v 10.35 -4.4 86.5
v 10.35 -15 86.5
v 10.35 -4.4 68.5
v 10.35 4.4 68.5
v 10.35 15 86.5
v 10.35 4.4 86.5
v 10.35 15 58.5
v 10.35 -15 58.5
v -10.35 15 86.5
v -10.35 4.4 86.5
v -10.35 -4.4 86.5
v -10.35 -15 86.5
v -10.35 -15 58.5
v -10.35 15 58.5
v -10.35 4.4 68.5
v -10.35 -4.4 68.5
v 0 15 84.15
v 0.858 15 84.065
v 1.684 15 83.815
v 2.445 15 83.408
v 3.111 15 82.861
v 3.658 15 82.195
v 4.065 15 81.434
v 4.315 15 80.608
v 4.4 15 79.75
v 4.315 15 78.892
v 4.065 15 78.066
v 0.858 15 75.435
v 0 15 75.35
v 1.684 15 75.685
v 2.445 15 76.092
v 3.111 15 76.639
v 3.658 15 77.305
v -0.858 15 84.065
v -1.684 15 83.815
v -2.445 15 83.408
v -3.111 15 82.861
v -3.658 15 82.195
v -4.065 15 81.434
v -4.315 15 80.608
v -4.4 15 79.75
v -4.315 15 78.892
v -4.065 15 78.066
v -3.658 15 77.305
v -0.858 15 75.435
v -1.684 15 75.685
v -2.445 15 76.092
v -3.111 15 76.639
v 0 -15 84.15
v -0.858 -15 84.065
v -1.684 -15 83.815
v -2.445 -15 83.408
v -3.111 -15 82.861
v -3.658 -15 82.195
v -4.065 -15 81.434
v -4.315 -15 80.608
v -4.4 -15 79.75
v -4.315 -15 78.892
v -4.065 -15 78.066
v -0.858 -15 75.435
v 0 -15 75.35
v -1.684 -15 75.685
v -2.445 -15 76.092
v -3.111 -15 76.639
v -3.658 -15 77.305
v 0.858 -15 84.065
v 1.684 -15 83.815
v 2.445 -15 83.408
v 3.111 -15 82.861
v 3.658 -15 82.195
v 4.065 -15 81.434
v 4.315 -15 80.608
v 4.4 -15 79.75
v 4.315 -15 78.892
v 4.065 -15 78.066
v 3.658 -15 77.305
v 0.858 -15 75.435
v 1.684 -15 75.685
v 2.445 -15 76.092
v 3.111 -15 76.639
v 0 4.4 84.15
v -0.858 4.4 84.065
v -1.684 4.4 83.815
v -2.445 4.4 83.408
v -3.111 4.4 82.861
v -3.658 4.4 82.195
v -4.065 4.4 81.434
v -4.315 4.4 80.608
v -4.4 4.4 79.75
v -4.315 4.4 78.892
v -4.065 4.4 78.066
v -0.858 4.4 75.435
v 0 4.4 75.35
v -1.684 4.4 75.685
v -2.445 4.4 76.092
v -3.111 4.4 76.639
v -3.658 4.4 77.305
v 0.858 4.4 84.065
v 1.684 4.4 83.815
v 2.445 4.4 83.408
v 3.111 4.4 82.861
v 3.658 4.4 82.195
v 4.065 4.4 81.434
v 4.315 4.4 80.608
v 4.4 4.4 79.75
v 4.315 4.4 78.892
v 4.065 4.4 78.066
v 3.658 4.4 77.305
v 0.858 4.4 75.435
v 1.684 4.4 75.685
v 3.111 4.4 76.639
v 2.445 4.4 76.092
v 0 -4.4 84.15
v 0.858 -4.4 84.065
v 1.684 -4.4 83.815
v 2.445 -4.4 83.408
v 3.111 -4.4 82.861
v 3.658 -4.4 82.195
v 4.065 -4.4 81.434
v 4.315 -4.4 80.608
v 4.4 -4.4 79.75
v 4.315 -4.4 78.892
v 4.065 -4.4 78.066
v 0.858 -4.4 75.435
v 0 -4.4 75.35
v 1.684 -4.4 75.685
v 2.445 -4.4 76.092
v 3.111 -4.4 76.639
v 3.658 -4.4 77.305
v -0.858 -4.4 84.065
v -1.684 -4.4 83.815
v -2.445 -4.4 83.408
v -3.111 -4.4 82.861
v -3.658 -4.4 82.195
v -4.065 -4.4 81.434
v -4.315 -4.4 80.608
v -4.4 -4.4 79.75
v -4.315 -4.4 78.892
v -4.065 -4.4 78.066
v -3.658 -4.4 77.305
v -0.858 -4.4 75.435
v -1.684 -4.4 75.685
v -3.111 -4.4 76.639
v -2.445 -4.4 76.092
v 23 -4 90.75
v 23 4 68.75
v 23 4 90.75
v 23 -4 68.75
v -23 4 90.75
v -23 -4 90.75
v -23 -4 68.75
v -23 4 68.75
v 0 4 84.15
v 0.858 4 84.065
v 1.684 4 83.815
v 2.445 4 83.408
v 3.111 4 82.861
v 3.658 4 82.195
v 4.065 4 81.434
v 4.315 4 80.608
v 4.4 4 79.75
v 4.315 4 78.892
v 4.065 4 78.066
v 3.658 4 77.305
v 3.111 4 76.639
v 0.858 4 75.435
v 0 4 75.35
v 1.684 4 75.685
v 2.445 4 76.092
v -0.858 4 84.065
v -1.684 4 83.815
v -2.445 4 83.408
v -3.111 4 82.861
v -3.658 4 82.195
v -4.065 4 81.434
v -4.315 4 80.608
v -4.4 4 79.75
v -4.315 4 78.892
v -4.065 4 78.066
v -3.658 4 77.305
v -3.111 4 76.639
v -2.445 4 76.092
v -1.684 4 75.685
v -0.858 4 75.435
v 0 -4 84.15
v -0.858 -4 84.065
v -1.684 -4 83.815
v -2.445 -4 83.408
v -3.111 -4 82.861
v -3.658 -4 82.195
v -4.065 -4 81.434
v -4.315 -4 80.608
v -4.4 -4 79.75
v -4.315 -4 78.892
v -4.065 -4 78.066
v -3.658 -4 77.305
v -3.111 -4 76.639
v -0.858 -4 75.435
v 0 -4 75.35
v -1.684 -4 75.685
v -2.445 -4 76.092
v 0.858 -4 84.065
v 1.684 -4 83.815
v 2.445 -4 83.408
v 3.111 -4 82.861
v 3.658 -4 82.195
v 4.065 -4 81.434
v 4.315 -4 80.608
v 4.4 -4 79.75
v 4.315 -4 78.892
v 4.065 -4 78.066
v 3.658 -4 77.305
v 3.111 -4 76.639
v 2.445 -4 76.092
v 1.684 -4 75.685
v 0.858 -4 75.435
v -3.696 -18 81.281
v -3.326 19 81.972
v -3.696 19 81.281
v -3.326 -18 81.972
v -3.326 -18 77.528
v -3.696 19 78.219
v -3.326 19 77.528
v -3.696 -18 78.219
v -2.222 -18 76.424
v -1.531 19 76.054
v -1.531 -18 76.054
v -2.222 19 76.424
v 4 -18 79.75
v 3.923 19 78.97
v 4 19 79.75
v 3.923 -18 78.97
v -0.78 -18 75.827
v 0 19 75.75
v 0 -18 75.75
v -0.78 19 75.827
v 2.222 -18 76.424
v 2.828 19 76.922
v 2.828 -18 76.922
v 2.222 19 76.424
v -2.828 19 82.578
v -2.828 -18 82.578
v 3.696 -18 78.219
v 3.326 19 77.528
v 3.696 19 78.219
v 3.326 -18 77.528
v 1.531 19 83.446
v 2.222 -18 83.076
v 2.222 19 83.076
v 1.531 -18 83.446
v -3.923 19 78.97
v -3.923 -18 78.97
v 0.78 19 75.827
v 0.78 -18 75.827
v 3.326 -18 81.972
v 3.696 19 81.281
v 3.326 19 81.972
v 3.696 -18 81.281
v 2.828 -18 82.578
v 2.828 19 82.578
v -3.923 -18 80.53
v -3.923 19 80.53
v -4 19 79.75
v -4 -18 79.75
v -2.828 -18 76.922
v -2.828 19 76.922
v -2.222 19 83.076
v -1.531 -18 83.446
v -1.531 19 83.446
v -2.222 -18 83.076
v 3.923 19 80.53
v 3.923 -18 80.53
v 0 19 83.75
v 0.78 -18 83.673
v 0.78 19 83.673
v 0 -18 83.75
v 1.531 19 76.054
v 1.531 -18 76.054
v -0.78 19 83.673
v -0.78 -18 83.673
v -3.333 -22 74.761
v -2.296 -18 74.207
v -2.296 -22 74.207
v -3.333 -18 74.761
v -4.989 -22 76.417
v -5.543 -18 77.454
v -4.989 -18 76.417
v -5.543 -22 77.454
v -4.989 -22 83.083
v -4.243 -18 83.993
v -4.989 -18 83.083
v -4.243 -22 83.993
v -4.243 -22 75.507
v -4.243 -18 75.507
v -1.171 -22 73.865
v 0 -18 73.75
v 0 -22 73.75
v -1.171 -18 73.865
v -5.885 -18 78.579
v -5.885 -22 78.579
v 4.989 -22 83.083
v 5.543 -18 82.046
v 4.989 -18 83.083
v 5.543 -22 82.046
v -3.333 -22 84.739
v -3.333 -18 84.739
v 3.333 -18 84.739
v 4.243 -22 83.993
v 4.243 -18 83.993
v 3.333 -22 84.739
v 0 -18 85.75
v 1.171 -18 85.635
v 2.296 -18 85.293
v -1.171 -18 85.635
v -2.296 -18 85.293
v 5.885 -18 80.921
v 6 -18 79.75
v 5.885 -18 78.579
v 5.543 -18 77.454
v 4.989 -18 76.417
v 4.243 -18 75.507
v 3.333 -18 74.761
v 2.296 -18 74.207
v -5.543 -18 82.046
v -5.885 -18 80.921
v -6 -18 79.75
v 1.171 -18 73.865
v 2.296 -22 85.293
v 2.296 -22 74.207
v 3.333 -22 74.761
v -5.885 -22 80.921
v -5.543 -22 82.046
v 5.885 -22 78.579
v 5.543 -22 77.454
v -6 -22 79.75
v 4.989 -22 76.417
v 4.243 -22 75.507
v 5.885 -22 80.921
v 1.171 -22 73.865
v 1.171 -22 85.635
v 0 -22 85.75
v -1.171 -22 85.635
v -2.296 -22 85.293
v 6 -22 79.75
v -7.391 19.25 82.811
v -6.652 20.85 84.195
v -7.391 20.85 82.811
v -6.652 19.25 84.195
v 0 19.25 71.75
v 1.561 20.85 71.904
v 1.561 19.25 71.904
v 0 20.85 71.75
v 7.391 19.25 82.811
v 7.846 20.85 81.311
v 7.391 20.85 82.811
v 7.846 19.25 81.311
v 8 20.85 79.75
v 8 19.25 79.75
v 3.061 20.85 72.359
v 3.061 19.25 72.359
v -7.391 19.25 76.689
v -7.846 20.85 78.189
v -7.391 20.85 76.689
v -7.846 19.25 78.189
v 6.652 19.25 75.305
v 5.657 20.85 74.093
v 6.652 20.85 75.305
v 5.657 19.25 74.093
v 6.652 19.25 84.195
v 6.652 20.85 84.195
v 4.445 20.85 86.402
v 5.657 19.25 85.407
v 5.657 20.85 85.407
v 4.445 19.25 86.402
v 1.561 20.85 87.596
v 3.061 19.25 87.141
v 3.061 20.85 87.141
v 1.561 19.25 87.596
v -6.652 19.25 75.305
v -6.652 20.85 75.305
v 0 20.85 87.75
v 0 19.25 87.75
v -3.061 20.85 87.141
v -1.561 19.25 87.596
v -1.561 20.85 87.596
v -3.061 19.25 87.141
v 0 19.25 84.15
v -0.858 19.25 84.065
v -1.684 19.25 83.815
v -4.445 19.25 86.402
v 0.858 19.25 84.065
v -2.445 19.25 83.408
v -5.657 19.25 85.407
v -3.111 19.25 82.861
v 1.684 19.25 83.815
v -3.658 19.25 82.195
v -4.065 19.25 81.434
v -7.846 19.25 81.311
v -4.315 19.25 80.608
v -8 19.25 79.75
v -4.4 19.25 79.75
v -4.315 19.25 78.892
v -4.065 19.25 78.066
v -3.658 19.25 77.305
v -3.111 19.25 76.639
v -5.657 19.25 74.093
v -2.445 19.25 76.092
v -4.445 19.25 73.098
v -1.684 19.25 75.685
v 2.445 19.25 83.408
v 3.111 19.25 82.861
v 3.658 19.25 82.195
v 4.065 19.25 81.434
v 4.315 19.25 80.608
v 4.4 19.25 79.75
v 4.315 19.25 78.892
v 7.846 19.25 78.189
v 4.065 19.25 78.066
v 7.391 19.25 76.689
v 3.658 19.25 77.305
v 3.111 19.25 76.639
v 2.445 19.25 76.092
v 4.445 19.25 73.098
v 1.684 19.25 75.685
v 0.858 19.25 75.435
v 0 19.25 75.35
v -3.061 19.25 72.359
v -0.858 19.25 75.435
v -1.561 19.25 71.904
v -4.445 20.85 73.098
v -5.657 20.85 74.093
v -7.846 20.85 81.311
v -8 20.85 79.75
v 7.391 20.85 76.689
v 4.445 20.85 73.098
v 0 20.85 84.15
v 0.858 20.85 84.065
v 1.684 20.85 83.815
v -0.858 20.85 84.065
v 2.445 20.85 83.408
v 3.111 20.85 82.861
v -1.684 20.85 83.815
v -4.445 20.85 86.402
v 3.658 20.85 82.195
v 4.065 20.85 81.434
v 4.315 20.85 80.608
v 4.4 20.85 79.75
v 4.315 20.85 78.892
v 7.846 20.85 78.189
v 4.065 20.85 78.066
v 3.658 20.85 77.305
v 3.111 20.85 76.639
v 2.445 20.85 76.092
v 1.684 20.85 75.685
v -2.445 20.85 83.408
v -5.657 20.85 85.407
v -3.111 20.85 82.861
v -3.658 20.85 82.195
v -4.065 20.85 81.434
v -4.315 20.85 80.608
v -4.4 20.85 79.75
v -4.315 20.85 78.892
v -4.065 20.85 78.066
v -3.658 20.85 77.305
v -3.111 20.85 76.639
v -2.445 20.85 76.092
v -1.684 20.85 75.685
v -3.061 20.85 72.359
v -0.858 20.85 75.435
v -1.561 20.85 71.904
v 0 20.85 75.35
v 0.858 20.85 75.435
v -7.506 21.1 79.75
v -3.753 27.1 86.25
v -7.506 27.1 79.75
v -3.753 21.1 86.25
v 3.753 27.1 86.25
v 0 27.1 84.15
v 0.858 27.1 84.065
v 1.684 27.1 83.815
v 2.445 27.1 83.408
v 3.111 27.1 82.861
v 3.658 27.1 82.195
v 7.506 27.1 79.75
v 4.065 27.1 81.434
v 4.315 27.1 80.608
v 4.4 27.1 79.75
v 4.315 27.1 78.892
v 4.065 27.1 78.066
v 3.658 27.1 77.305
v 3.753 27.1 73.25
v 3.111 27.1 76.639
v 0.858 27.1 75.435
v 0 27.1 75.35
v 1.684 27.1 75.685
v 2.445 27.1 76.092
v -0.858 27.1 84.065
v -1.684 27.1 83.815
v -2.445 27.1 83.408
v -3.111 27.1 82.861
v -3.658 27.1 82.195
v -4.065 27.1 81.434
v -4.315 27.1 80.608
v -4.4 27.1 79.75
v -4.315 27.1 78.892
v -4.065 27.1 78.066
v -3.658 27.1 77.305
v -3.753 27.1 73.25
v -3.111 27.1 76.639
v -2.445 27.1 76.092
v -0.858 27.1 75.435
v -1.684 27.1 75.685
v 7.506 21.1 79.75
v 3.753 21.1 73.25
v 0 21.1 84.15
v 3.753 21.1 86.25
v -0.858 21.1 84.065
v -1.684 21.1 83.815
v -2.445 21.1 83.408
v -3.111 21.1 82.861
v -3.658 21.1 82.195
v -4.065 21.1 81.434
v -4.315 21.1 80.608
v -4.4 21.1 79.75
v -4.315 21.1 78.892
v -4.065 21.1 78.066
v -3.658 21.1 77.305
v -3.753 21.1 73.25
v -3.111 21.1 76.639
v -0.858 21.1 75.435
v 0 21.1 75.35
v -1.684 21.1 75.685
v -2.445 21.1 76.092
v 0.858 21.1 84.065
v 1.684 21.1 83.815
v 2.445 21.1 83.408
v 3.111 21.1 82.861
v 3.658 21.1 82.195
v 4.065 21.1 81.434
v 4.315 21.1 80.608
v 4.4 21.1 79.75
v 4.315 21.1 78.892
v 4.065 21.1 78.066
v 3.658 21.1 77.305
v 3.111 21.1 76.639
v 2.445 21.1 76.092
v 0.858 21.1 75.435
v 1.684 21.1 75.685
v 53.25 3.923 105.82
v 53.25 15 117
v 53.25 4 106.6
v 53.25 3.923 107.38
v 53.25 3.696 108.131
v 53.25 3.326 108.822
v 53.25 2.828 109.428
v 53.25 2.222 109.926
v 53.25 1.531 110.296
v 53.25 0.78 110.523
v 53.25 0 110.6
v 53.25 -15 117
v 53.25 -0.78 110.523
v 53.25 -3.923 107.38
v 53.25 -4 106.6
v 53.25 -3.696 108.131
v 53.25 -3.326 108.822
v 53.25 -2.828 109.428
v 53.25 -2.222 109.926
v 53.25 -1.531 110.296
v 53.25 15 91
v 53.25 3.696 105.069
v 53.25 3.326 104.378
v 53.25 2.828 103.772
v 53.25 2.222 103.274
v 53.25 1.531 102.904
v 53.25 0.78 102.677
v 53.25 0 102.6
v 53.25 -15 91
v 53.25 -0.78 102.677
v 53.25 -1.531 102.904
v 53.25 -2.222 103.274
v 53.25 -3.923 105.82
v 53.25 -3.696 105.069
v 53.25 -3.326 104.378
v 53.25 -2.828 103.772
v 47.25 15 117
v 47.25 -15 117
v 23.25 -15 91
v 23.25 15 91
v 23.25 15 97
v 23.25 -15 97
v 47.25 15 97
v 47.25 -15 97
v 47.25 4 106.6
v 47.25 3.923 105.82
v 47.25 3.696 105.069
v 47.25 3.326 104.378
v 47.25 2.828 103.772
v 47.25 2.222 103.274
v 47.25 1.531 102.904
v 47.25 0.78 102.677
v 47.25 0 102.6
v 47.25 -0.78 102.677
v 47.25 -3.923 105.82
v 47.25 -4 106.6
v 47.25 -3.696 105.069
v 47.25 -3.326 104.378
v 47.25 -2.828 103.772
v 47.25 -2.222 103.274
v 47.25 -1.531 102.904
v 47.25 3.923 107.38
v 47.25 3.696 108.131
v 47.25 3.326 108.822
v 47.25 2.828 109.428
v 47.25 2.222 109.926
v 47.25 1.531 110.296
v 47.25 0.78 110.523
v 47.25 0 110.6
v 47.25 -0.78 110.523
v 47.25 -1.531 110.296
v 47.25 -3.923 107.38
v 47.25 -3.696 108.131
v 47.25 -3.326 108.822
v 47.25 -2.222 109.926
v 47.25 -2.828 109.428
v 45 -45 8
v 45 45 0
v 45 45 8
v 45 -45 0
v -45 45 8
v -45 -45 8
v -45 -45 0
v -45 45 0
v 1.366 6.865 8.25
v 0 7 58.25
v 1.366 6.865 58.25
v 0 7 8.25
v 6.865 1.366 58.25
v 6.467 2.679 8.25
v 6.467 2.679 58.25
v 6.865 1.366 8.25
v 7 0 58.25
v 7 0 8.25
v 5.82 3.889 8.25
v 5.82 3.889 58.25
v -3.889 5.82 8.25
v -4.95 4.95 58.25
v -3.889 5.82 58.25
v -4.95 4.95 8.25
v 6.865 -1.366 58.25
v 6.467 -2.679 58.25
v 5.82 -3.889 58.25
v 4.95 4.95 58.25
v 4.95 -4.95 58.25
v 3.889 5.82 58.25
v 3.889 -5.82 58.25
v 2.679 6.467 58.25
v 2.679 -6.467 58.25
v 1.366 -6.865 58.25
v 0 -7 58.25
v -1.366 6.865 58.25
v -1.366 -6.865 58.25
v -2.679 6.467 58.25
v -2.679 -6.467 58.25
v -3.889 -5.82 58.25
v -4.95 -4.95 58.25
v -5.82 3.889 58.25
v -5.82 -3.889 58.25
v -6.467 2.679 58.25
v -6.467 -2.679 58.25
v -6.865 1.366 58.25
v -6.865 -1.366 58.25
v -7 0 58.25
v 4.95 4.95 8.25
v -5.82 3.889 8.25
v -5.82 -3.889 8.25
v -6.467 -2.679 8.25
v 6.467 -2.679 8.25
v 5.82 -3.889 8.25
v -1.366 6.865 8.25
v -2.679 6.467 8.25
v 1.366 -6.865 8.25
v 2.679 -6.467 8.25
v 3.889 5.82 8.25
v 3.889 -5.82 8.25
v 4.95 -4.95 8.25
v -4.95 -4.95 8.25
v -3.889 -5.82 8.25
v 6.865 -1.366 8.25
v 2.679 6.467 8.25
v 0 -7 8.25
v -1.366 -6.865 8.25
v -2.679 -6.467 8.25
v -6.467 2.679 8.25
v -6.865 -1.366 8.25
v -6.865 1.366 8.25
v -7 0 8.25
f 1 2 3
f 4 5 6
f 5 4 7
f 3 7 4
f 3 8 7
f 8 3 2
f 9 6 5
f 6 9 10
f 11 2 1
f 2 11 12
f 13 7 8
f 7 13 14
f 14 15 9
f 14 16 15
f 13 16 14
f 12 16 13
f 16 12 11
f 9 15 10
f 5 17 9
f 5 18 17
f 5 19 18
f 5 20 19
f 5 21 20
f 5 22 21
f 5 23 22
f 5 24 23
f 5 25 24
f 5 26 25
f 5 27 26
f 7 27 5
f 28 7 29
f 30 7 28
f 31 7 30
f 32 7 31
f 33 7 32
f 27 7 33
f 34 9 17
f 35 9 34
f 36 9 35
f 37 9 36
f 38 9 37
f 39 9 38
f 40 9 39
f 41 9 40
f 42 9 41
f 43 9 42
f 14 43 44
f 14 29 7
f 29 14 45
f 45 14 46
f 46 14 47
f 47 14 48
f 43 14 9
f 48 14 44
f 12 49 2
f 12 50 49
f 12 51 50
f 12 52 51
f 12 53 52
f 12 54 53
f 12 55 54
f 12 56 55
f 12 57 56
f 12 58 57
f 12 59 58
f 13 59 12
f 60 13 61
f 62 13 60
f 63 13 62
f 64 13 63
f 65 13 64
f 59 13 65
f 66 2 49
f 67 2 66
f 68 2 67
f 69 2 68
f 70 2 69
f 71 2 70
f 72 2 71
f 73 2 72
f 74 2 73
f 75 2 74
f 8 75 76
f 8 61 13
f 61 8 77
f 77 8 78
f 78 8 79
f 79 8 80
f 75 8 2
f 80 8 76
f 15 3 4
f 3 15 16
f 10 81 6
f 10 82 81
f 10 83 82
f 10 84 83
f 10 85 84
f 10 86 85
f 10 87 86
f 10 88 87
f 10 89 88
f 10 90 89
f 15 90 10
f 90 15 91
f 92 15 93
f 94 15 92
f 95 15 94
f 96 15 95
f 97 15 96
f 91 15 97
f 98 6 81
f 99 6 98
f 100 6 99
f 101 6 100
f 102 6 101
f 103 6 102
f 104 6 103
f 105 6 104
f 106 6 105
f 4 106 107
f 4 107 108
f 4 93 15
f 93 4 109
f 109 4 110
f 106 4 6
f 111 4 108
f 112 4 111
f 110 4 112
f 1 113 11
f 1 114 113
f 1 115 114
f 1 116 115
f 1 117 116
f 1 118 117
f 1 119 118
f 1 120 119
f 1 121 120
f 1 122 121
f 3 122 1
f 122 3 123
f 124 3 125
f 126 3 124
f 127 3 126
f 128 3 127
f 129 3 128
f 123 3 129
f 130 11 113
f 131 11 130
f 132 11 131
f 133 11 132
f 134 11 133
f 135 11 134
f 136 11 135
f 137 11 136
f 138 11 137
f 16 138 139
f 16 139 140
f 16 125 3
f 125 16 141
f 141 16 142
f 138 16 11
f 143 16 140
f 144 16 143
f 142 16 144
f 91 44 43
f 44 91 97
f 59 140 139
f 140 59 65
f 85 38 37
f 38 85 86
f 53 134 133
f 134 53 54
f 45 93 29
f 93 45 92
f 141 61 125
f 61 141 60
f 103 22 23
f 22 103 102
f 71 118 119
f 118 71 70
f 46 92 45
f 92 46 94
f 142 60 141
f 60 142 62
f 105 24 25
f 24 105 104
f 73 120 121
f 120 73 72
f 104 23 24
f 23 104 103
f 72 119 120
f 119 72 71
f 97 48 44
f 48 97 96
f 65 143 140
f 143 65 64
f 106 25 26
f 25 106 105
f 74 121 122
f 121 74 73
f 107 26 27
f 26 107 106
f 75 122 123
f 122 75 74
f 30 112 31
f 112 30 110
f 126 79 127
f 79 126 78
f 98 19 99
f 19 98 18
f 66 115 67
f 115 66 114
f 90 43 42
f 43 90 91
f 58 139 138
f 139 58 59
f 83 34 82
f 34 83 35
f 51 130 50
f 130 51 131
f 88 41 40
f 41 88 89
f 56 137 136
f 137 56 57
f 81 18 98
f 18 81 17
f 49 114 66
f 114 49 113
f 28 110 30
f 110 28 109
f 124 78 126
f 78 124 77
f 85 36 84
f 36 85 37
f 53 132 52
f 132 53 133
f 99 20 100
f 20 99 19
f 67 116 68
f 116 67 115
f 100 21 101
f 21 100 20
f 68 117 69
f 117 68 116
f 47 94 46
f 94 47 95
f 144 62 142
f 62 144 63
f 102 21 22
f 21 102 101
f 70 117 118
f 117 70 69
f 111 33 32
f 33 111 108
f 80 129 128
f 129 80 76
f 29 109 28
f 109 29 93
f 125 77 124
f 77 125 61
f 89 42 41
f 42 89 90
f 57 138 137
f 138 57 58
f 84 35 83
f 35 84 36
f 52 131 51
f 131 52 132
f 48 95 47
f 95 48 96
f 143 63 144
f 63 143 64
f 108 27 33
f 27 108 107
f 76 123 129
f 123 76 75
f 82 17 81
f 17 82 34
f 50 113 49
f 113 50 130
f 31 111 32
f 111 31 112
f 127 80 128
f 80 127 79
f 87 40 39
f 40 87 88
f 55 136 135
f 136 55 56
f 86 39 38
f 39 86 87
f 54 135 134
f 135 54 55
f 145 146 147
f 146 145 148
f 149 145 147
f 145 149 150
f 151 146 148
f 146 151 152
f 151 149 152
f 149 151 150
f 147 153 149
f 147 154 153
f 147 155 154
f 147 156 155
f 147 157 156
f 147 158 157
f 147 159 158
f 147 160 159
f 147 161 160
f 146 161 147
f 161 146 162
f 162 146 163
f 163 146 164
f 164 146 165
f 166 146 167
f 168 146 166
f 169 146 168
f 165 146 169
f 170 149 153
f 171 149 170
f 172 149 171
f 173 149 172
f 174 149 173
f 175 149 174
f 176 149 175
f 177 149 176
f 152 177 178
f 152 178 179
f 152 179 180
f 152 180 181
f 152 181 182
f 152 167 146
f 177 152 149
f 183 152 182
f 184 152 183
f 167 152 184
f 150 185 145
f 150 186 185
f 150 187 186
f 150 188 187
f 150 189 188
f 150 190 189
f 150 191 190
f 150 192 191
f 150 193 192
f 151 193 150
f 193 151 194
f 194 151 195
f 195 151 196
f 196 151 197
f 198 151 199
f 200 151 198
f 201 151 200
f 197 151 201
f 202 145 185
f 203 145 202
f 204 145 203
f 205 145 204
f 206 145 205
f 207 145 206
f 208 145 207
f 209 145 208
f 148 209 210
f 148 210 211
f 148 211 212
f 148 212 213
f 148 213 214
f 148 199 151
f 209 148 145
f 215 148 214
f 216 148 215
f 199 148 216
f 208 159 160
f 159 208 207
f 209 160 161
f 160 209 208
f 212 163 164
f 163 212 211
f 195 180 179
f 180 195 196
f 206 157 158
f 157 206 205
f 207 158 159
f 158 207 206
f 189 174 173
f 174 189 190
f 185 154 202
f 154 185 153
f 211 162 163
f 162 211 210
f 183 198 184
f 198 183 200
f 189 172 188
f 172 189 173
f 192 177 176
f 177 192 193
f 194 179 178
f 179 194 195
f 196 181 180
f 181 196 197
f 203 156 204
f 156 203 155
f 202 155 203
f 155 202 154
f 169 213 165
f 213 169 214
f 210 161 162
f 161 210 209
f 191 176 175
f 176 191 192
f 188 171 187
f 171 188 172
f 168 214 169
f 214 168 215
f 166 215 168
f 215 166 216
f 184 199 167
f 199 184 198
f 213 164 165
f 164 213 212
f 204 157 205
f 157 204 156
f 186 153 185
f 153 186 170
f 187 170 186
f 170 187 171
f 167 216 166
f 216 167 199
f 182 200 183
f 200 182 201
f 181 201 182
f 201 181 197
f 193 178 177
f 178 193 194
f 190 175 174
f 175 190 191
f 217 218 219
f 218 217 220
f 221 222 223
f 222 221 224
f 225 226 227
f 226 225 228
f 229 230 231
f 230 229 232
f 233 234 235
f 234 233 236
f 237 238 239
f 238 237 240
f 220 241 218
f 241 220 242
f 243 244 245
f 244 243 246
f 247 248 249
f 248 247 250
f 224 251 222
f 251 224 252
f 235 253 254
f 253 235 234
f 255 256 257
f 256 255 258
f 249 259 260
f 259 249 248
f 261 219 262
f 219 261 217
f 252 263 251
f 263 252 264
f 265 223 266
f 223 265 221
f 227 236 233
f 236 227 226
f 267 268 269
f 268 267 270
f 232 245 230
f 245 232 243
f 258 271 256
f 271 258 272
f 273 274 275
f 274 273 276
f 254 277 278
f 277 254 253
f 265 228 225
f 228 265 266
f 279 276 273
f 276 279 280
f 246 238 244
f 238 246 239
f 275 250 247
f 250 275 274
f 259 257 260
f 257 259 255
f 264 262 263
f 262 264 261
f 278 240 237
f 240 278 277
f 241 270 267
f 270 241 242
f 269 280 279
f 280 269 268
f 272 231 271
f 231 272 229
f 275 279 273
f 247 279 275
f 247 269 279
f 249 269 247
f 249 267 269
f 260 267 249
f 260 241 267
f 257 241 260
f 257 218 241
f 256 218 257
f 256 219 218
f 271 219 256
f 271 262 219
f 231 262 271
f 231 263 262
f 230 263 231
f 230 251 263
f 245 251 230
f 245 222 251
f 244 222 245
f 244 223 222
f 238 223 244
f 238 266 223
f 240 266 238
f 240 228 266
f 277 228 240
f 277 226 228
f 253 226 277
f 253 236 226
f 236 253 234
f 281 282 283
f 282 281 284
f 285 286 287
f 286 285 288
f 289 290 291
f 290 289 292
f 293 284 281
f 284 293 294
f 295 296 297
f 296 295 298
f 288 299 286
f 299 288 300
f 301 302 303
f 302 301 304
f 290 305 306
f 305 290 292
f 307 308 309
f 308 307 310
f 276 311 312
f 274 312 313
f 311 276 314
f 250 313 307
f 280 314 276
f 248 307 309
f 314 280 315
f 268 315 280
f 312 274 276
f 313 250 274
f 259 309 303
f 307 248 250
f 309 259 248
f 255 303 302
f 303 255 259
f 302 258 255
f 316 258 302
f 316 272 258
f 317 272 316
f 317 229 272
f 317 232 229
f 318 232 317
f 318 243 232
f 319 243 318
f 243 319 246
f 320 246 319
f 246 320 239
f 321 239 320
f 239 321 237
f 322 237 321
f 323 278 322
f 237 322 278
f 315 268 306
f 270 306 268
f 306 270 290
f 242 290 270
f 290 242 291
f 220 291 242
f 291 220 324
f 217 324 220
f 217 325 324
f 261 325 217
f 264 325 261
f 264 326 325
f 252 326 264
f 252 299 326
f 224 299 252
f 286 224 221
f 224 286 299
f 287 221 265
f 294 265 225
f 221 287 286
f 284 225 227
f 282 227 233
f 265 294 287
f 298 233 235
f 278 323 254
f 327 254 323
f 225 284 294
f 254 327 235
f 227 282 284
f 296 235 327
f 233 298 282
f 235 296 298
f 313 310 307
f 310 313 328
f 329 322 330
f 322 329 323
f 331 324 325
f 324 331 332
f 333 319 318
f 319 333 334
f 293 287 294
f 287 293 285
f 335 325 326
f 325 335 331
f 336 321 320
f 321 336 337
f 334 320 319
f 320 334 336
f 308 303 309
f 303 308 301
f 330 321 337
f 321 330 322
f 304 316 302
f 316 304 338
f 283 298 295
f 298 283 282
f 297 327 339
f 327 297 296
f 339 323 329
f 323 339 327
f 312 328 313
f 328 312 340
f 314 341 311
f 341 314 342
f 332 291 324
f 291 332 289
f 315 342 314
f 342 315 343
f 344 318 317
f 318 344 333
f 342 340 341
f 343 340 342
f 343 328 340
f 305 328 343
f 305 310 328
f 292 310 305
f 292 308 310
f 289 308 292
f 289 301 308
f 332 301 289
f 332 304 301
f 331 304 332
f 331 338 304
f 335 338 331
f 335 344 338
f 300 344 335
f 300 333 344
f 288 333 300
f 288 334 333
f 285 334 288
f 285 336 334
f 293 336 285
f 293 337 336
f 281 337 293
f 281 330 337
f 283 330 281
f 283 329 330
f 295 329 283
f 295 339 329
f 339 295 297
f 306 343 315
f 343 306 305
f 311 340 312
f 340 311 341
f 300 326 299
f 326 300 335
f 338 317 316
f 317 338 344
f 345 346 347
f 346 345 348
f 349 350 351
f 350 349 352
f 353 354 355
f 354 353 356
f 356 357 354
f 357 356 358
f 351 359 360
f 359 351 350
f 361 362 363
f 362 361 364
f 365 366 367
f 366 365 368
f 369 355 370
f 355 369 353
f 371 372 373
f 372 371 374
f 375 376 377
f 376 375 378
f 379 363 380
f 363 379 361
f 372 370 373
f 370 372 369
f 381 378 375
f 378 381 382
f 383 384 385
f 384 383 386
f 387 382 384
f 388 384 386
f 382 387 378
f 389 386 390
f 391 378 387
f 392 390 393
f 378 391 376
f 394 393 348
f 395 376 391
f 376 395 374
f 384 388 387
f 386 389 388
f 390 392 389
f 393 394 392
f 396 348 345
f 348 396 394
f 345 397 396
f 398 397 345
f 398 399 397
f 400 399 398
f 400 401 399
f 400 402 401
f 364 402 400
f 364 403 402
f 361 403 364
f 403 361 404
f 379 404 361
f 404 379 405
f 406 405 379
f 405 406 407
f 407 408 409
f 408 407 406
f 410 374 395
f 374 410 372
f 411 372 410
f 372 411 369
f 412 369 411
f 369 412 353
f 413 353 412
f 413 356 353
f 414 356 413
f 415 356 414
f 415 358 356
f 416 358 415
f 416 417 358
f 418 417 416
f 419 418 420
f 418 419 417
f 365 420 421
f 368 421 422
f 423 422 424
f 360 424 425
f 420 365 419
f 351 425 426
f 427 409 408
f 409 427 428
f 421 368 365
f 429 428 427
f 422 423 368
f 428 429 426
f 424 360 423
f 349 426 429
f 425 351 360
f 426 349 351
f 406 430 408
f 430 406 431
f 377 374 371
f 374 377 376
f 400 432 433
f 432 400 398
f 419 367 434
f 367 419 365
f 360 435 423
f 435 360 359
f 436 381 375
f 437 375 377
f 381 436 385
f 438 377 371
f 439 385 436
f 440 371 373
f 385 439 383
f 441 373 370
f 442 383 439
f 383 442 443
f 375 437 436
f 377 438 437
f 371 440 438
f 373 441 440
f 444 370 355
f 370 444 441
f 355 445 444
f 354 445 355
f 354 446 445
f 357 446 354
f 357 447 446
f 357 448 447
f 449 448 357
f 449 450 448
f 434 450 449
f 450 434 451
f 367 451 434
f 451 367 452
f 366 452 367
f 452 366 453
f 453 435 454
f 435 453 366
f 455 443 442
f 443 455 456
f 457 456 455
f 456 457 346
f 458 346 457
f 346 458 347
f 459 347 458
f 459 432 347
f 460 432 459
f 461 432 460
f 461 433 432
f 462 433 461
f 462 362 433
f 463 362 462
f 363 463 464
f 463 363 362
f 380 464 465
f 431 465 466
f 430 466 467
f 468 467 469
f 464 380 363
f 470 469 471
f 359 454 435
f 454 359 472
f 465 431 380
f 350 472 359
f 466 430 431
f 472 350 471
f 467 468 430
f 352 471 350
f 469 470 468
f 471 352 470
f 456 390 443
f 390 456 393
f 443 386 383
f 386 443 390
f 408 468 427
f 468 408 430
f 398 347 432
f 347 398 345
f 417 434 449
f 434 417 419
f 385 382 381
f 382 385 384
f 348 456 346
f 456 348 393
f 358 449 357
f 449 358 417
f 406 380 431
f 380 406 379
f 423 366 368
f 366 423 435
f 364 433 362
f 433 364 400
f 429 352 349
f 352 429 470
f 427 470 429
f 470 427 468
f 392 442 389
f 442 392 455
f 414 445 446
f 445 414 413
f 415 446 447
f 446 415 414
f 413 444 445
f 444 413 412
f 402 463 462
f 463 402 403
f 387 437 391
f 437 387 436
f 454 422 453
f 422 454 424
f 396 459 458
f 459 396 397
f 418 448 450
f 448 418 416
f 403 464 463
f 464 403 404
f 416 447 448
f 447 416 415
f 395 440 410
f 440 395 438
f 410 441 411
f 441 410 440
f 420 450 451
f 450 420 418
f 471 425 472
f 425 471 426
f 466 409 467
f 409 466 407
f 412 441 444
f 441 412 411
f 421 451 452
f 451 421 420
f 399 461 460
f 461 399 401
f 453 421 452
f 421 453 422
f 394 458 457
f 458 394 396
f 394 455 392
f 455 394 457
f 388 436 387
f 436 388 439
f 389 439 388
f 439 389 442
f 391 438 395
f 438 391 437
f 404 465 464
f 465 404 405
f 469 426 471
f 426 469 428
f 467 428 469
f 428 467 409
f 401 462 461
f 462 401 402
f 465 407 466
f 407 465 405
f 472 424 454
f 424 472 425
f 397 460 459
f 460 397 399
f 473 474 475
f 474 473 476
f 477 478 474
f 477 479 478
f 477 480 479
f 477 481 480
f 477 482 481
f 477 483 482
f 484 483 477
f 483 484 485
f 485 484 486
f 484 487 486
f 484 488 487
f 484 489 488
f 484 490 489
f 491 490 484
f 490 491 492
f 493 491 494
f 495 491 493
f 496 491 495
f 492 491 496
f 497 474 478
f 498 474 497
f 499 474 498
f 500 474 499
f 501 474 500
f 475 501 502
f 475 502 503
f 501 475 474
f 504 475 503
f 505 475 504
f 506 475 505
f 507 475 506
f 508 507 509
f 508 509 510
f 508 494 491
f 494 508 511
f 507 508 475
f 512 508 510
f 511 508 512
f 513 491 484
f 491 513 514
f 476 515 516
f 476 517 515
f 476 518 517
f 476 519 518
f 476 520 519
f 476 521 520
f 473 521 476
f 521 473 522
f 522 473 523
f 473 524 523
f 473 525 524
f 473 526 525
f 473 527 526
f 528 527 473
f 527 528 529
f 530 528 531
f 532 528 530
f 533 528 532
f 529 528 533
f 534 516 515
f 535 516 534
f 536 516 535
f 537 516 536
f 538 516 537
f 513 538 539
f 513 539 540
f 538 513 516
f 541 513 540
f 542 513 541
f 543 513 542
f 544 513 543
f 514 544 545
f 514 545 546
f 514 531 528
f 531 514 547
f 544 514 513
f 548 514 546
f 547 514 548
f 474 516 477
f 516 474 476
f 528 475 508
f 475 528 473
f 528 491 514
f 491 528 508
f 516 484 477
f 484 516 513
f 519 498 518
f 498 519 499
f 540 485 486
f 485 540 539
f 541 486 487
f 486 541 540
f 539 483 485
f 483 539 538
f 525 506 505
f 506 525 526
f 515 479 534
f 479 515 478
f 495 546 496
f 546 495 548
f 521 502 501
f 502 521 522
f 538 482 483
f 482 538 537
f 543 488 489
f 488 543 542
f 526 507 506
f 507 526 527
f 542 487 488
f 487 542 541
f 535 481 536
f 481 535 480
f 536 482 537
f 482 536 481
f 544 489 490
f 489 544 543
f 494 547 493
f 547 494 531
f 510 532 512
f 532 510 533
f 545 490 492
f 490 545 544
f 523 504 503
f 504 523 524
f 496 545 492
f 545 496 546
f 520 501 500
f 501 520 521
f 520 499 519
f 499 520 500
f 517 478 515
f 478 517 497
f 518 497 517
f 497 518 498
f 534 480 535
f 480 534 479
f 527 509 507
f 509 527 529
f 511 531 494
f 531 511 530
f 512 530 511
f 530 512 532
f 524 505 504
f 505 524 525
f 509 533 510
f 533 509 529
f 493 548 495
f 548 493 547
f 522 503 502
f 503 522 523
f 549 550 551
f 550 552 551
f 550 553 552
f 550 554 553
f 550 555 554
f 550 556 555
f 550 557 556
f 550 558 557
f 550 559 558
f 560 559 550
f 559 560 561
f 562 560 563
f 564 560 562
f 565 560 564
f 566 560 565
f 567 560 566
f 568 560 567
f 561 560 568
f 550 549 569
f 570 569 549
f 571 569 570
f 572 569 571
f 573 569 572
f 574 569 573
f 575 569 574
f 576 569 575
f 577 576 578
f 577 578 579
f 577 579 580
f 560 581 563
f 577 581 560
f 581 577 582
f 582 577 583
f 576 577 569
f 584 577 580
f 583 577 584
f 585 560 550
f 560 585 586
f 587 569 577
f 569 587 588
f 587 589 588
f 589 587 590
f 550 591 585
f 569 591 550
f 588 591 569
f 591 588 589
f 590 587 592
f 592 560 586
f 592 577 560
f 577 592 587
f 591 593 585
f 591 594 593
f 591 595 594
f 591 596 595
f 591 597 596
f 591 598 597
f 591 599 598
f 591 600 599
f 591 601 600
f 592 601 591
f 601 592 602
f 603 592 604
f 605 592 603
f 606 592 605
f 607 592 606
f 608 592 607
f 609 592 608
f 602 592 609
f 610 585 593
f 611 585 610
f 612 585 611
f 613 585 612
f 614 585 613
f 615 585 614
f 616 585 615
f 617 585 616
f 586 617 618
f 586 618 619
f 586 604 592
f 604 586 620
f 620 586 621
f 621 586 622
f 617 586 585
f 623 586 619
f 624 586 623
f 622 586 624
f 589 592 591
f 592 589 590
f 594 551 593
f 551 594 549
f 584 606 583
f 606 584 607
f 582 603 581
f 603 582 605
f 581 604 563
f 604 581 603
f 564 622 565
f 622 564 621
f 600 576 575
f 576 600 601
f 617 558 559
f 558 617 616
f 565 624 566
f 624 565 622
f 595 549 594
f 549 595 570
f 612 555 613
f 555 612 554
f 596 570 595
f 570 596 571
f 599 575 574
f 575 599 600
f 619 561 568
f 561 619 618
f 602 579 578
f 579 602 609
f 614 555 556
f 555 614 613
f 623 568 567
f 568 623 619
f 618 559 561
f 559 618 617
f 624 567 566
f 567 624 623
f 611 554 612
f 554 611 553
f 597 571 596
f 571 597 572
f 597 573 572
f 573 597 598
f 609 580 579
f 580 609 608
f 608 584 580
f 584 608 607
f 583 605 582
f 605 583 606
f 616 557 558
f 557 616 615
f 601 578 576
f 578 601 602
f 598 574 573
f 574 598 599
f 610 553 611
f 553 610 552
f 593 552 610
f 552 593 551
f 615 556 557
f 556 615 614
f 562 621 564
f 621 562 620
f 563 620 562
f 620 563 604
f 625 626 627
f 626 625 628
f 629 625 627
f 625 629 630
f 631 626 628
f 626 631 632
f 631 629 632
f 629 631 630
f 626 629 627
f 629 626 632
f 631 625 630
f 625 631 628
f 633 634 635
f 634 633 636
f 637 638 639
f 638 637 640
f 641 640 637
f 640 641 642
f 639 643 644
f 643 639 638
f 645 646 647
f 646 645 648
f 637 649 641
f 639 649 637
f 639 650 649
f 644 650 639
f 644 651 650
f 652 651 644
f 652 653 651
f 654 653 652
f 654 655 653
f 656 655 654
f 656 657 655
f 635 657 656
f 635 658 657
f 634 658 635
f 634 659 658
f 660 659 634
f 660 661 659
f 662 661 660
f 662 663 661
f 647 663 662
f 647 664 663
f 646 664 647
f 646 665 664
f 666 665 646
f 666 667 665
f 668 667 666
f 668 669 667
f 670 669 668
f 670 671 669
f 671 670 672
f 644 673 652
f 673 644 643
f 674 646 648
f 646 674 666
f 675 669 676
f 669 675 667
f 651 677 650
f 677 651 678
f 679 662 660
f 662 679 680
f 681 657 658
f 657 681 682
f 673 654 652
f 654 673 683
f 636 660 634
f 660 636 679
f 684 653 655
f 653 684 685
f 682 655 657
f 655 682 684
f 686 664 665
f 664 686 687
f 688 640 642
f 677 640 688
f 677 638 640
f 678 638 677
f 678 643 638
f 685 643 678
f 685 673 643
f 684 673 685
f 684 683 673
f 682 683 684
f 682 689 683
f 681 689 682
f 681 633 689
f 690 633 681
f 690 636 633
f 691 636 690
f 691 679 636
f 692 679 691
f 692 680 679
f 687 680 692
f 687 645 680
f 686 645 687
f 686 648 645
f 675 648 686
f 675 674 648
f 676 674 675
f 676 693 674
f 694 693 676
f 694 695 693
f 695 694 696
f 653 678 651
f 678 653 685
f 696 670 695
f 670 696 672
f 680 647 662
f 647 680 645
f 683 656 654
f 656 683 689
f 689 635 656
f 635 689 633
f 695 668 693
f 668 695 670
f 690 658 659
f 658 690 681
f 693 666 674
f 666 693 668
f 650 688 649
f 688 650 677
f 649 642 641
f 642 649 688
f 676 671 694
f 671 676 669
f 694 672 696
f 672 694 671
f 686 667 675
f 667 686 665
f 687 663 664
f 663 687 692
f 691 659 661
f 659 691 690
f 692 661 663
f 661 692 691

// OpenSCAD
$fn = 32;

// ------------------------------------------------------------------------
// Lamp arm: column d14 x 50 mm, arm 46 mm
// Every part is its own module, assembly() places every instance.
// ------------------------------------------------------------------------

// --- part 1 ---
module lamp_base() {
  difference() {
    translate([-45, -45, 0]) cube([90, 90, 8]);
  }
}

// --- part 2 ---
module lamp_column() {
  cylinder(h = 50, d = 14);
}

// --- part 3 ---
module head_fork() {
  difference() {
    translate([-10.35, -15, 0]) cube([20.7, 30, 28]);
    translate([-11.35, -4.4, 10]) cube([22.7, 8.8, 19]);
    translate([0, 0, 21.25]) rotate([90, 0, 0]) cylinder(h = 32, d = 8.8, center = true);
  }
}

// --- part 4 ---
module lamp_arm() {
  difference() {
    translate([-23, -4, 0]) cube([46, 8, 22]);
    translate([0, 0, 11]) rotate([90, 0, 0]) cylinder(h = 10, d = 8.8, center = true);
  }
}

// --- part 5 ---
module arm_pin() {
  rotate([0, 90, 0]) cylinder(h = 38, d = 8, center = true);
  translate([-22, 0, 0]) rotate([0, 90, 0]) cylinder(h = 4, d = 12);
}

// --- part 6 ---
module arm_washer() {
  difference() {
      translate([0, 0, 0]) cylinder(h = 1.6, d = 16);
      translate([0, 0, -1]) cylinder(h = 3.6, d = 8.8);
    }
}

// --- part 7 ---
module arm_nut() {
  difference() {
    linear_extrude(height = 6) polygon(points = [[7.506, 0], [3.753, 6.5], [-3.753, 6.5], [-7.506, 0], [-3.753, -6.5], [3.753, -6.5]]);
    translate([0, 0, -1]) cylinder(h = 8, d = 8.8);
  }
}

// --- part 8 ---
module shade_bracket() {
  difference() {
    translate([-15, -15, 0]) cube([30, 30, 26]);
    translate([-16, -16, 6]) cube([25, 32, 21]);
    translate([12, 0, 15.6]) rotate([0, 90, 0]) cylinder(h = 8, d = 8, center = true);
  }
}

// --- assembly ---
module assembly() {
  color([0.80, 0.24, 0.20]) translate([0, 0, 0]) rotate([0, 0, 0]) lamp_base();
  color([0.20, 0.45, 0.75]) translate([0, 0, 8.25]) rotate([0, 0, 0]) lamp_column();
  color([0.25, 0.62, 0.32]) translate([0, 0, 58.5]) rotate([0, 0, 0]) head_fork();
  color([0.92, 0.70, 0.18]) translate([0, 0, 68.75]) rotate([0, 0, 0]) lamp_arm();
  color([0.58, 0.35, 0.70]) translate([0, 0, 79.75]) rotate([0, 0, 90]) arm_pin();
  color([0.16, 0.66, 0.66]) translate([0, 20.85, 79.75]) rotate([90, 0, 0]) arm_washer();
  color([0.85, 0.48, 0.18]) translate([0, 27.1, 79.75]) rotate([90, 0, 0]) arm_nut();
  color([0.55, 0.60, 0.65]) translate([38.25, 0, 91]) rotate([0, 0, 0]) shade_bracket();
}

assembly();
